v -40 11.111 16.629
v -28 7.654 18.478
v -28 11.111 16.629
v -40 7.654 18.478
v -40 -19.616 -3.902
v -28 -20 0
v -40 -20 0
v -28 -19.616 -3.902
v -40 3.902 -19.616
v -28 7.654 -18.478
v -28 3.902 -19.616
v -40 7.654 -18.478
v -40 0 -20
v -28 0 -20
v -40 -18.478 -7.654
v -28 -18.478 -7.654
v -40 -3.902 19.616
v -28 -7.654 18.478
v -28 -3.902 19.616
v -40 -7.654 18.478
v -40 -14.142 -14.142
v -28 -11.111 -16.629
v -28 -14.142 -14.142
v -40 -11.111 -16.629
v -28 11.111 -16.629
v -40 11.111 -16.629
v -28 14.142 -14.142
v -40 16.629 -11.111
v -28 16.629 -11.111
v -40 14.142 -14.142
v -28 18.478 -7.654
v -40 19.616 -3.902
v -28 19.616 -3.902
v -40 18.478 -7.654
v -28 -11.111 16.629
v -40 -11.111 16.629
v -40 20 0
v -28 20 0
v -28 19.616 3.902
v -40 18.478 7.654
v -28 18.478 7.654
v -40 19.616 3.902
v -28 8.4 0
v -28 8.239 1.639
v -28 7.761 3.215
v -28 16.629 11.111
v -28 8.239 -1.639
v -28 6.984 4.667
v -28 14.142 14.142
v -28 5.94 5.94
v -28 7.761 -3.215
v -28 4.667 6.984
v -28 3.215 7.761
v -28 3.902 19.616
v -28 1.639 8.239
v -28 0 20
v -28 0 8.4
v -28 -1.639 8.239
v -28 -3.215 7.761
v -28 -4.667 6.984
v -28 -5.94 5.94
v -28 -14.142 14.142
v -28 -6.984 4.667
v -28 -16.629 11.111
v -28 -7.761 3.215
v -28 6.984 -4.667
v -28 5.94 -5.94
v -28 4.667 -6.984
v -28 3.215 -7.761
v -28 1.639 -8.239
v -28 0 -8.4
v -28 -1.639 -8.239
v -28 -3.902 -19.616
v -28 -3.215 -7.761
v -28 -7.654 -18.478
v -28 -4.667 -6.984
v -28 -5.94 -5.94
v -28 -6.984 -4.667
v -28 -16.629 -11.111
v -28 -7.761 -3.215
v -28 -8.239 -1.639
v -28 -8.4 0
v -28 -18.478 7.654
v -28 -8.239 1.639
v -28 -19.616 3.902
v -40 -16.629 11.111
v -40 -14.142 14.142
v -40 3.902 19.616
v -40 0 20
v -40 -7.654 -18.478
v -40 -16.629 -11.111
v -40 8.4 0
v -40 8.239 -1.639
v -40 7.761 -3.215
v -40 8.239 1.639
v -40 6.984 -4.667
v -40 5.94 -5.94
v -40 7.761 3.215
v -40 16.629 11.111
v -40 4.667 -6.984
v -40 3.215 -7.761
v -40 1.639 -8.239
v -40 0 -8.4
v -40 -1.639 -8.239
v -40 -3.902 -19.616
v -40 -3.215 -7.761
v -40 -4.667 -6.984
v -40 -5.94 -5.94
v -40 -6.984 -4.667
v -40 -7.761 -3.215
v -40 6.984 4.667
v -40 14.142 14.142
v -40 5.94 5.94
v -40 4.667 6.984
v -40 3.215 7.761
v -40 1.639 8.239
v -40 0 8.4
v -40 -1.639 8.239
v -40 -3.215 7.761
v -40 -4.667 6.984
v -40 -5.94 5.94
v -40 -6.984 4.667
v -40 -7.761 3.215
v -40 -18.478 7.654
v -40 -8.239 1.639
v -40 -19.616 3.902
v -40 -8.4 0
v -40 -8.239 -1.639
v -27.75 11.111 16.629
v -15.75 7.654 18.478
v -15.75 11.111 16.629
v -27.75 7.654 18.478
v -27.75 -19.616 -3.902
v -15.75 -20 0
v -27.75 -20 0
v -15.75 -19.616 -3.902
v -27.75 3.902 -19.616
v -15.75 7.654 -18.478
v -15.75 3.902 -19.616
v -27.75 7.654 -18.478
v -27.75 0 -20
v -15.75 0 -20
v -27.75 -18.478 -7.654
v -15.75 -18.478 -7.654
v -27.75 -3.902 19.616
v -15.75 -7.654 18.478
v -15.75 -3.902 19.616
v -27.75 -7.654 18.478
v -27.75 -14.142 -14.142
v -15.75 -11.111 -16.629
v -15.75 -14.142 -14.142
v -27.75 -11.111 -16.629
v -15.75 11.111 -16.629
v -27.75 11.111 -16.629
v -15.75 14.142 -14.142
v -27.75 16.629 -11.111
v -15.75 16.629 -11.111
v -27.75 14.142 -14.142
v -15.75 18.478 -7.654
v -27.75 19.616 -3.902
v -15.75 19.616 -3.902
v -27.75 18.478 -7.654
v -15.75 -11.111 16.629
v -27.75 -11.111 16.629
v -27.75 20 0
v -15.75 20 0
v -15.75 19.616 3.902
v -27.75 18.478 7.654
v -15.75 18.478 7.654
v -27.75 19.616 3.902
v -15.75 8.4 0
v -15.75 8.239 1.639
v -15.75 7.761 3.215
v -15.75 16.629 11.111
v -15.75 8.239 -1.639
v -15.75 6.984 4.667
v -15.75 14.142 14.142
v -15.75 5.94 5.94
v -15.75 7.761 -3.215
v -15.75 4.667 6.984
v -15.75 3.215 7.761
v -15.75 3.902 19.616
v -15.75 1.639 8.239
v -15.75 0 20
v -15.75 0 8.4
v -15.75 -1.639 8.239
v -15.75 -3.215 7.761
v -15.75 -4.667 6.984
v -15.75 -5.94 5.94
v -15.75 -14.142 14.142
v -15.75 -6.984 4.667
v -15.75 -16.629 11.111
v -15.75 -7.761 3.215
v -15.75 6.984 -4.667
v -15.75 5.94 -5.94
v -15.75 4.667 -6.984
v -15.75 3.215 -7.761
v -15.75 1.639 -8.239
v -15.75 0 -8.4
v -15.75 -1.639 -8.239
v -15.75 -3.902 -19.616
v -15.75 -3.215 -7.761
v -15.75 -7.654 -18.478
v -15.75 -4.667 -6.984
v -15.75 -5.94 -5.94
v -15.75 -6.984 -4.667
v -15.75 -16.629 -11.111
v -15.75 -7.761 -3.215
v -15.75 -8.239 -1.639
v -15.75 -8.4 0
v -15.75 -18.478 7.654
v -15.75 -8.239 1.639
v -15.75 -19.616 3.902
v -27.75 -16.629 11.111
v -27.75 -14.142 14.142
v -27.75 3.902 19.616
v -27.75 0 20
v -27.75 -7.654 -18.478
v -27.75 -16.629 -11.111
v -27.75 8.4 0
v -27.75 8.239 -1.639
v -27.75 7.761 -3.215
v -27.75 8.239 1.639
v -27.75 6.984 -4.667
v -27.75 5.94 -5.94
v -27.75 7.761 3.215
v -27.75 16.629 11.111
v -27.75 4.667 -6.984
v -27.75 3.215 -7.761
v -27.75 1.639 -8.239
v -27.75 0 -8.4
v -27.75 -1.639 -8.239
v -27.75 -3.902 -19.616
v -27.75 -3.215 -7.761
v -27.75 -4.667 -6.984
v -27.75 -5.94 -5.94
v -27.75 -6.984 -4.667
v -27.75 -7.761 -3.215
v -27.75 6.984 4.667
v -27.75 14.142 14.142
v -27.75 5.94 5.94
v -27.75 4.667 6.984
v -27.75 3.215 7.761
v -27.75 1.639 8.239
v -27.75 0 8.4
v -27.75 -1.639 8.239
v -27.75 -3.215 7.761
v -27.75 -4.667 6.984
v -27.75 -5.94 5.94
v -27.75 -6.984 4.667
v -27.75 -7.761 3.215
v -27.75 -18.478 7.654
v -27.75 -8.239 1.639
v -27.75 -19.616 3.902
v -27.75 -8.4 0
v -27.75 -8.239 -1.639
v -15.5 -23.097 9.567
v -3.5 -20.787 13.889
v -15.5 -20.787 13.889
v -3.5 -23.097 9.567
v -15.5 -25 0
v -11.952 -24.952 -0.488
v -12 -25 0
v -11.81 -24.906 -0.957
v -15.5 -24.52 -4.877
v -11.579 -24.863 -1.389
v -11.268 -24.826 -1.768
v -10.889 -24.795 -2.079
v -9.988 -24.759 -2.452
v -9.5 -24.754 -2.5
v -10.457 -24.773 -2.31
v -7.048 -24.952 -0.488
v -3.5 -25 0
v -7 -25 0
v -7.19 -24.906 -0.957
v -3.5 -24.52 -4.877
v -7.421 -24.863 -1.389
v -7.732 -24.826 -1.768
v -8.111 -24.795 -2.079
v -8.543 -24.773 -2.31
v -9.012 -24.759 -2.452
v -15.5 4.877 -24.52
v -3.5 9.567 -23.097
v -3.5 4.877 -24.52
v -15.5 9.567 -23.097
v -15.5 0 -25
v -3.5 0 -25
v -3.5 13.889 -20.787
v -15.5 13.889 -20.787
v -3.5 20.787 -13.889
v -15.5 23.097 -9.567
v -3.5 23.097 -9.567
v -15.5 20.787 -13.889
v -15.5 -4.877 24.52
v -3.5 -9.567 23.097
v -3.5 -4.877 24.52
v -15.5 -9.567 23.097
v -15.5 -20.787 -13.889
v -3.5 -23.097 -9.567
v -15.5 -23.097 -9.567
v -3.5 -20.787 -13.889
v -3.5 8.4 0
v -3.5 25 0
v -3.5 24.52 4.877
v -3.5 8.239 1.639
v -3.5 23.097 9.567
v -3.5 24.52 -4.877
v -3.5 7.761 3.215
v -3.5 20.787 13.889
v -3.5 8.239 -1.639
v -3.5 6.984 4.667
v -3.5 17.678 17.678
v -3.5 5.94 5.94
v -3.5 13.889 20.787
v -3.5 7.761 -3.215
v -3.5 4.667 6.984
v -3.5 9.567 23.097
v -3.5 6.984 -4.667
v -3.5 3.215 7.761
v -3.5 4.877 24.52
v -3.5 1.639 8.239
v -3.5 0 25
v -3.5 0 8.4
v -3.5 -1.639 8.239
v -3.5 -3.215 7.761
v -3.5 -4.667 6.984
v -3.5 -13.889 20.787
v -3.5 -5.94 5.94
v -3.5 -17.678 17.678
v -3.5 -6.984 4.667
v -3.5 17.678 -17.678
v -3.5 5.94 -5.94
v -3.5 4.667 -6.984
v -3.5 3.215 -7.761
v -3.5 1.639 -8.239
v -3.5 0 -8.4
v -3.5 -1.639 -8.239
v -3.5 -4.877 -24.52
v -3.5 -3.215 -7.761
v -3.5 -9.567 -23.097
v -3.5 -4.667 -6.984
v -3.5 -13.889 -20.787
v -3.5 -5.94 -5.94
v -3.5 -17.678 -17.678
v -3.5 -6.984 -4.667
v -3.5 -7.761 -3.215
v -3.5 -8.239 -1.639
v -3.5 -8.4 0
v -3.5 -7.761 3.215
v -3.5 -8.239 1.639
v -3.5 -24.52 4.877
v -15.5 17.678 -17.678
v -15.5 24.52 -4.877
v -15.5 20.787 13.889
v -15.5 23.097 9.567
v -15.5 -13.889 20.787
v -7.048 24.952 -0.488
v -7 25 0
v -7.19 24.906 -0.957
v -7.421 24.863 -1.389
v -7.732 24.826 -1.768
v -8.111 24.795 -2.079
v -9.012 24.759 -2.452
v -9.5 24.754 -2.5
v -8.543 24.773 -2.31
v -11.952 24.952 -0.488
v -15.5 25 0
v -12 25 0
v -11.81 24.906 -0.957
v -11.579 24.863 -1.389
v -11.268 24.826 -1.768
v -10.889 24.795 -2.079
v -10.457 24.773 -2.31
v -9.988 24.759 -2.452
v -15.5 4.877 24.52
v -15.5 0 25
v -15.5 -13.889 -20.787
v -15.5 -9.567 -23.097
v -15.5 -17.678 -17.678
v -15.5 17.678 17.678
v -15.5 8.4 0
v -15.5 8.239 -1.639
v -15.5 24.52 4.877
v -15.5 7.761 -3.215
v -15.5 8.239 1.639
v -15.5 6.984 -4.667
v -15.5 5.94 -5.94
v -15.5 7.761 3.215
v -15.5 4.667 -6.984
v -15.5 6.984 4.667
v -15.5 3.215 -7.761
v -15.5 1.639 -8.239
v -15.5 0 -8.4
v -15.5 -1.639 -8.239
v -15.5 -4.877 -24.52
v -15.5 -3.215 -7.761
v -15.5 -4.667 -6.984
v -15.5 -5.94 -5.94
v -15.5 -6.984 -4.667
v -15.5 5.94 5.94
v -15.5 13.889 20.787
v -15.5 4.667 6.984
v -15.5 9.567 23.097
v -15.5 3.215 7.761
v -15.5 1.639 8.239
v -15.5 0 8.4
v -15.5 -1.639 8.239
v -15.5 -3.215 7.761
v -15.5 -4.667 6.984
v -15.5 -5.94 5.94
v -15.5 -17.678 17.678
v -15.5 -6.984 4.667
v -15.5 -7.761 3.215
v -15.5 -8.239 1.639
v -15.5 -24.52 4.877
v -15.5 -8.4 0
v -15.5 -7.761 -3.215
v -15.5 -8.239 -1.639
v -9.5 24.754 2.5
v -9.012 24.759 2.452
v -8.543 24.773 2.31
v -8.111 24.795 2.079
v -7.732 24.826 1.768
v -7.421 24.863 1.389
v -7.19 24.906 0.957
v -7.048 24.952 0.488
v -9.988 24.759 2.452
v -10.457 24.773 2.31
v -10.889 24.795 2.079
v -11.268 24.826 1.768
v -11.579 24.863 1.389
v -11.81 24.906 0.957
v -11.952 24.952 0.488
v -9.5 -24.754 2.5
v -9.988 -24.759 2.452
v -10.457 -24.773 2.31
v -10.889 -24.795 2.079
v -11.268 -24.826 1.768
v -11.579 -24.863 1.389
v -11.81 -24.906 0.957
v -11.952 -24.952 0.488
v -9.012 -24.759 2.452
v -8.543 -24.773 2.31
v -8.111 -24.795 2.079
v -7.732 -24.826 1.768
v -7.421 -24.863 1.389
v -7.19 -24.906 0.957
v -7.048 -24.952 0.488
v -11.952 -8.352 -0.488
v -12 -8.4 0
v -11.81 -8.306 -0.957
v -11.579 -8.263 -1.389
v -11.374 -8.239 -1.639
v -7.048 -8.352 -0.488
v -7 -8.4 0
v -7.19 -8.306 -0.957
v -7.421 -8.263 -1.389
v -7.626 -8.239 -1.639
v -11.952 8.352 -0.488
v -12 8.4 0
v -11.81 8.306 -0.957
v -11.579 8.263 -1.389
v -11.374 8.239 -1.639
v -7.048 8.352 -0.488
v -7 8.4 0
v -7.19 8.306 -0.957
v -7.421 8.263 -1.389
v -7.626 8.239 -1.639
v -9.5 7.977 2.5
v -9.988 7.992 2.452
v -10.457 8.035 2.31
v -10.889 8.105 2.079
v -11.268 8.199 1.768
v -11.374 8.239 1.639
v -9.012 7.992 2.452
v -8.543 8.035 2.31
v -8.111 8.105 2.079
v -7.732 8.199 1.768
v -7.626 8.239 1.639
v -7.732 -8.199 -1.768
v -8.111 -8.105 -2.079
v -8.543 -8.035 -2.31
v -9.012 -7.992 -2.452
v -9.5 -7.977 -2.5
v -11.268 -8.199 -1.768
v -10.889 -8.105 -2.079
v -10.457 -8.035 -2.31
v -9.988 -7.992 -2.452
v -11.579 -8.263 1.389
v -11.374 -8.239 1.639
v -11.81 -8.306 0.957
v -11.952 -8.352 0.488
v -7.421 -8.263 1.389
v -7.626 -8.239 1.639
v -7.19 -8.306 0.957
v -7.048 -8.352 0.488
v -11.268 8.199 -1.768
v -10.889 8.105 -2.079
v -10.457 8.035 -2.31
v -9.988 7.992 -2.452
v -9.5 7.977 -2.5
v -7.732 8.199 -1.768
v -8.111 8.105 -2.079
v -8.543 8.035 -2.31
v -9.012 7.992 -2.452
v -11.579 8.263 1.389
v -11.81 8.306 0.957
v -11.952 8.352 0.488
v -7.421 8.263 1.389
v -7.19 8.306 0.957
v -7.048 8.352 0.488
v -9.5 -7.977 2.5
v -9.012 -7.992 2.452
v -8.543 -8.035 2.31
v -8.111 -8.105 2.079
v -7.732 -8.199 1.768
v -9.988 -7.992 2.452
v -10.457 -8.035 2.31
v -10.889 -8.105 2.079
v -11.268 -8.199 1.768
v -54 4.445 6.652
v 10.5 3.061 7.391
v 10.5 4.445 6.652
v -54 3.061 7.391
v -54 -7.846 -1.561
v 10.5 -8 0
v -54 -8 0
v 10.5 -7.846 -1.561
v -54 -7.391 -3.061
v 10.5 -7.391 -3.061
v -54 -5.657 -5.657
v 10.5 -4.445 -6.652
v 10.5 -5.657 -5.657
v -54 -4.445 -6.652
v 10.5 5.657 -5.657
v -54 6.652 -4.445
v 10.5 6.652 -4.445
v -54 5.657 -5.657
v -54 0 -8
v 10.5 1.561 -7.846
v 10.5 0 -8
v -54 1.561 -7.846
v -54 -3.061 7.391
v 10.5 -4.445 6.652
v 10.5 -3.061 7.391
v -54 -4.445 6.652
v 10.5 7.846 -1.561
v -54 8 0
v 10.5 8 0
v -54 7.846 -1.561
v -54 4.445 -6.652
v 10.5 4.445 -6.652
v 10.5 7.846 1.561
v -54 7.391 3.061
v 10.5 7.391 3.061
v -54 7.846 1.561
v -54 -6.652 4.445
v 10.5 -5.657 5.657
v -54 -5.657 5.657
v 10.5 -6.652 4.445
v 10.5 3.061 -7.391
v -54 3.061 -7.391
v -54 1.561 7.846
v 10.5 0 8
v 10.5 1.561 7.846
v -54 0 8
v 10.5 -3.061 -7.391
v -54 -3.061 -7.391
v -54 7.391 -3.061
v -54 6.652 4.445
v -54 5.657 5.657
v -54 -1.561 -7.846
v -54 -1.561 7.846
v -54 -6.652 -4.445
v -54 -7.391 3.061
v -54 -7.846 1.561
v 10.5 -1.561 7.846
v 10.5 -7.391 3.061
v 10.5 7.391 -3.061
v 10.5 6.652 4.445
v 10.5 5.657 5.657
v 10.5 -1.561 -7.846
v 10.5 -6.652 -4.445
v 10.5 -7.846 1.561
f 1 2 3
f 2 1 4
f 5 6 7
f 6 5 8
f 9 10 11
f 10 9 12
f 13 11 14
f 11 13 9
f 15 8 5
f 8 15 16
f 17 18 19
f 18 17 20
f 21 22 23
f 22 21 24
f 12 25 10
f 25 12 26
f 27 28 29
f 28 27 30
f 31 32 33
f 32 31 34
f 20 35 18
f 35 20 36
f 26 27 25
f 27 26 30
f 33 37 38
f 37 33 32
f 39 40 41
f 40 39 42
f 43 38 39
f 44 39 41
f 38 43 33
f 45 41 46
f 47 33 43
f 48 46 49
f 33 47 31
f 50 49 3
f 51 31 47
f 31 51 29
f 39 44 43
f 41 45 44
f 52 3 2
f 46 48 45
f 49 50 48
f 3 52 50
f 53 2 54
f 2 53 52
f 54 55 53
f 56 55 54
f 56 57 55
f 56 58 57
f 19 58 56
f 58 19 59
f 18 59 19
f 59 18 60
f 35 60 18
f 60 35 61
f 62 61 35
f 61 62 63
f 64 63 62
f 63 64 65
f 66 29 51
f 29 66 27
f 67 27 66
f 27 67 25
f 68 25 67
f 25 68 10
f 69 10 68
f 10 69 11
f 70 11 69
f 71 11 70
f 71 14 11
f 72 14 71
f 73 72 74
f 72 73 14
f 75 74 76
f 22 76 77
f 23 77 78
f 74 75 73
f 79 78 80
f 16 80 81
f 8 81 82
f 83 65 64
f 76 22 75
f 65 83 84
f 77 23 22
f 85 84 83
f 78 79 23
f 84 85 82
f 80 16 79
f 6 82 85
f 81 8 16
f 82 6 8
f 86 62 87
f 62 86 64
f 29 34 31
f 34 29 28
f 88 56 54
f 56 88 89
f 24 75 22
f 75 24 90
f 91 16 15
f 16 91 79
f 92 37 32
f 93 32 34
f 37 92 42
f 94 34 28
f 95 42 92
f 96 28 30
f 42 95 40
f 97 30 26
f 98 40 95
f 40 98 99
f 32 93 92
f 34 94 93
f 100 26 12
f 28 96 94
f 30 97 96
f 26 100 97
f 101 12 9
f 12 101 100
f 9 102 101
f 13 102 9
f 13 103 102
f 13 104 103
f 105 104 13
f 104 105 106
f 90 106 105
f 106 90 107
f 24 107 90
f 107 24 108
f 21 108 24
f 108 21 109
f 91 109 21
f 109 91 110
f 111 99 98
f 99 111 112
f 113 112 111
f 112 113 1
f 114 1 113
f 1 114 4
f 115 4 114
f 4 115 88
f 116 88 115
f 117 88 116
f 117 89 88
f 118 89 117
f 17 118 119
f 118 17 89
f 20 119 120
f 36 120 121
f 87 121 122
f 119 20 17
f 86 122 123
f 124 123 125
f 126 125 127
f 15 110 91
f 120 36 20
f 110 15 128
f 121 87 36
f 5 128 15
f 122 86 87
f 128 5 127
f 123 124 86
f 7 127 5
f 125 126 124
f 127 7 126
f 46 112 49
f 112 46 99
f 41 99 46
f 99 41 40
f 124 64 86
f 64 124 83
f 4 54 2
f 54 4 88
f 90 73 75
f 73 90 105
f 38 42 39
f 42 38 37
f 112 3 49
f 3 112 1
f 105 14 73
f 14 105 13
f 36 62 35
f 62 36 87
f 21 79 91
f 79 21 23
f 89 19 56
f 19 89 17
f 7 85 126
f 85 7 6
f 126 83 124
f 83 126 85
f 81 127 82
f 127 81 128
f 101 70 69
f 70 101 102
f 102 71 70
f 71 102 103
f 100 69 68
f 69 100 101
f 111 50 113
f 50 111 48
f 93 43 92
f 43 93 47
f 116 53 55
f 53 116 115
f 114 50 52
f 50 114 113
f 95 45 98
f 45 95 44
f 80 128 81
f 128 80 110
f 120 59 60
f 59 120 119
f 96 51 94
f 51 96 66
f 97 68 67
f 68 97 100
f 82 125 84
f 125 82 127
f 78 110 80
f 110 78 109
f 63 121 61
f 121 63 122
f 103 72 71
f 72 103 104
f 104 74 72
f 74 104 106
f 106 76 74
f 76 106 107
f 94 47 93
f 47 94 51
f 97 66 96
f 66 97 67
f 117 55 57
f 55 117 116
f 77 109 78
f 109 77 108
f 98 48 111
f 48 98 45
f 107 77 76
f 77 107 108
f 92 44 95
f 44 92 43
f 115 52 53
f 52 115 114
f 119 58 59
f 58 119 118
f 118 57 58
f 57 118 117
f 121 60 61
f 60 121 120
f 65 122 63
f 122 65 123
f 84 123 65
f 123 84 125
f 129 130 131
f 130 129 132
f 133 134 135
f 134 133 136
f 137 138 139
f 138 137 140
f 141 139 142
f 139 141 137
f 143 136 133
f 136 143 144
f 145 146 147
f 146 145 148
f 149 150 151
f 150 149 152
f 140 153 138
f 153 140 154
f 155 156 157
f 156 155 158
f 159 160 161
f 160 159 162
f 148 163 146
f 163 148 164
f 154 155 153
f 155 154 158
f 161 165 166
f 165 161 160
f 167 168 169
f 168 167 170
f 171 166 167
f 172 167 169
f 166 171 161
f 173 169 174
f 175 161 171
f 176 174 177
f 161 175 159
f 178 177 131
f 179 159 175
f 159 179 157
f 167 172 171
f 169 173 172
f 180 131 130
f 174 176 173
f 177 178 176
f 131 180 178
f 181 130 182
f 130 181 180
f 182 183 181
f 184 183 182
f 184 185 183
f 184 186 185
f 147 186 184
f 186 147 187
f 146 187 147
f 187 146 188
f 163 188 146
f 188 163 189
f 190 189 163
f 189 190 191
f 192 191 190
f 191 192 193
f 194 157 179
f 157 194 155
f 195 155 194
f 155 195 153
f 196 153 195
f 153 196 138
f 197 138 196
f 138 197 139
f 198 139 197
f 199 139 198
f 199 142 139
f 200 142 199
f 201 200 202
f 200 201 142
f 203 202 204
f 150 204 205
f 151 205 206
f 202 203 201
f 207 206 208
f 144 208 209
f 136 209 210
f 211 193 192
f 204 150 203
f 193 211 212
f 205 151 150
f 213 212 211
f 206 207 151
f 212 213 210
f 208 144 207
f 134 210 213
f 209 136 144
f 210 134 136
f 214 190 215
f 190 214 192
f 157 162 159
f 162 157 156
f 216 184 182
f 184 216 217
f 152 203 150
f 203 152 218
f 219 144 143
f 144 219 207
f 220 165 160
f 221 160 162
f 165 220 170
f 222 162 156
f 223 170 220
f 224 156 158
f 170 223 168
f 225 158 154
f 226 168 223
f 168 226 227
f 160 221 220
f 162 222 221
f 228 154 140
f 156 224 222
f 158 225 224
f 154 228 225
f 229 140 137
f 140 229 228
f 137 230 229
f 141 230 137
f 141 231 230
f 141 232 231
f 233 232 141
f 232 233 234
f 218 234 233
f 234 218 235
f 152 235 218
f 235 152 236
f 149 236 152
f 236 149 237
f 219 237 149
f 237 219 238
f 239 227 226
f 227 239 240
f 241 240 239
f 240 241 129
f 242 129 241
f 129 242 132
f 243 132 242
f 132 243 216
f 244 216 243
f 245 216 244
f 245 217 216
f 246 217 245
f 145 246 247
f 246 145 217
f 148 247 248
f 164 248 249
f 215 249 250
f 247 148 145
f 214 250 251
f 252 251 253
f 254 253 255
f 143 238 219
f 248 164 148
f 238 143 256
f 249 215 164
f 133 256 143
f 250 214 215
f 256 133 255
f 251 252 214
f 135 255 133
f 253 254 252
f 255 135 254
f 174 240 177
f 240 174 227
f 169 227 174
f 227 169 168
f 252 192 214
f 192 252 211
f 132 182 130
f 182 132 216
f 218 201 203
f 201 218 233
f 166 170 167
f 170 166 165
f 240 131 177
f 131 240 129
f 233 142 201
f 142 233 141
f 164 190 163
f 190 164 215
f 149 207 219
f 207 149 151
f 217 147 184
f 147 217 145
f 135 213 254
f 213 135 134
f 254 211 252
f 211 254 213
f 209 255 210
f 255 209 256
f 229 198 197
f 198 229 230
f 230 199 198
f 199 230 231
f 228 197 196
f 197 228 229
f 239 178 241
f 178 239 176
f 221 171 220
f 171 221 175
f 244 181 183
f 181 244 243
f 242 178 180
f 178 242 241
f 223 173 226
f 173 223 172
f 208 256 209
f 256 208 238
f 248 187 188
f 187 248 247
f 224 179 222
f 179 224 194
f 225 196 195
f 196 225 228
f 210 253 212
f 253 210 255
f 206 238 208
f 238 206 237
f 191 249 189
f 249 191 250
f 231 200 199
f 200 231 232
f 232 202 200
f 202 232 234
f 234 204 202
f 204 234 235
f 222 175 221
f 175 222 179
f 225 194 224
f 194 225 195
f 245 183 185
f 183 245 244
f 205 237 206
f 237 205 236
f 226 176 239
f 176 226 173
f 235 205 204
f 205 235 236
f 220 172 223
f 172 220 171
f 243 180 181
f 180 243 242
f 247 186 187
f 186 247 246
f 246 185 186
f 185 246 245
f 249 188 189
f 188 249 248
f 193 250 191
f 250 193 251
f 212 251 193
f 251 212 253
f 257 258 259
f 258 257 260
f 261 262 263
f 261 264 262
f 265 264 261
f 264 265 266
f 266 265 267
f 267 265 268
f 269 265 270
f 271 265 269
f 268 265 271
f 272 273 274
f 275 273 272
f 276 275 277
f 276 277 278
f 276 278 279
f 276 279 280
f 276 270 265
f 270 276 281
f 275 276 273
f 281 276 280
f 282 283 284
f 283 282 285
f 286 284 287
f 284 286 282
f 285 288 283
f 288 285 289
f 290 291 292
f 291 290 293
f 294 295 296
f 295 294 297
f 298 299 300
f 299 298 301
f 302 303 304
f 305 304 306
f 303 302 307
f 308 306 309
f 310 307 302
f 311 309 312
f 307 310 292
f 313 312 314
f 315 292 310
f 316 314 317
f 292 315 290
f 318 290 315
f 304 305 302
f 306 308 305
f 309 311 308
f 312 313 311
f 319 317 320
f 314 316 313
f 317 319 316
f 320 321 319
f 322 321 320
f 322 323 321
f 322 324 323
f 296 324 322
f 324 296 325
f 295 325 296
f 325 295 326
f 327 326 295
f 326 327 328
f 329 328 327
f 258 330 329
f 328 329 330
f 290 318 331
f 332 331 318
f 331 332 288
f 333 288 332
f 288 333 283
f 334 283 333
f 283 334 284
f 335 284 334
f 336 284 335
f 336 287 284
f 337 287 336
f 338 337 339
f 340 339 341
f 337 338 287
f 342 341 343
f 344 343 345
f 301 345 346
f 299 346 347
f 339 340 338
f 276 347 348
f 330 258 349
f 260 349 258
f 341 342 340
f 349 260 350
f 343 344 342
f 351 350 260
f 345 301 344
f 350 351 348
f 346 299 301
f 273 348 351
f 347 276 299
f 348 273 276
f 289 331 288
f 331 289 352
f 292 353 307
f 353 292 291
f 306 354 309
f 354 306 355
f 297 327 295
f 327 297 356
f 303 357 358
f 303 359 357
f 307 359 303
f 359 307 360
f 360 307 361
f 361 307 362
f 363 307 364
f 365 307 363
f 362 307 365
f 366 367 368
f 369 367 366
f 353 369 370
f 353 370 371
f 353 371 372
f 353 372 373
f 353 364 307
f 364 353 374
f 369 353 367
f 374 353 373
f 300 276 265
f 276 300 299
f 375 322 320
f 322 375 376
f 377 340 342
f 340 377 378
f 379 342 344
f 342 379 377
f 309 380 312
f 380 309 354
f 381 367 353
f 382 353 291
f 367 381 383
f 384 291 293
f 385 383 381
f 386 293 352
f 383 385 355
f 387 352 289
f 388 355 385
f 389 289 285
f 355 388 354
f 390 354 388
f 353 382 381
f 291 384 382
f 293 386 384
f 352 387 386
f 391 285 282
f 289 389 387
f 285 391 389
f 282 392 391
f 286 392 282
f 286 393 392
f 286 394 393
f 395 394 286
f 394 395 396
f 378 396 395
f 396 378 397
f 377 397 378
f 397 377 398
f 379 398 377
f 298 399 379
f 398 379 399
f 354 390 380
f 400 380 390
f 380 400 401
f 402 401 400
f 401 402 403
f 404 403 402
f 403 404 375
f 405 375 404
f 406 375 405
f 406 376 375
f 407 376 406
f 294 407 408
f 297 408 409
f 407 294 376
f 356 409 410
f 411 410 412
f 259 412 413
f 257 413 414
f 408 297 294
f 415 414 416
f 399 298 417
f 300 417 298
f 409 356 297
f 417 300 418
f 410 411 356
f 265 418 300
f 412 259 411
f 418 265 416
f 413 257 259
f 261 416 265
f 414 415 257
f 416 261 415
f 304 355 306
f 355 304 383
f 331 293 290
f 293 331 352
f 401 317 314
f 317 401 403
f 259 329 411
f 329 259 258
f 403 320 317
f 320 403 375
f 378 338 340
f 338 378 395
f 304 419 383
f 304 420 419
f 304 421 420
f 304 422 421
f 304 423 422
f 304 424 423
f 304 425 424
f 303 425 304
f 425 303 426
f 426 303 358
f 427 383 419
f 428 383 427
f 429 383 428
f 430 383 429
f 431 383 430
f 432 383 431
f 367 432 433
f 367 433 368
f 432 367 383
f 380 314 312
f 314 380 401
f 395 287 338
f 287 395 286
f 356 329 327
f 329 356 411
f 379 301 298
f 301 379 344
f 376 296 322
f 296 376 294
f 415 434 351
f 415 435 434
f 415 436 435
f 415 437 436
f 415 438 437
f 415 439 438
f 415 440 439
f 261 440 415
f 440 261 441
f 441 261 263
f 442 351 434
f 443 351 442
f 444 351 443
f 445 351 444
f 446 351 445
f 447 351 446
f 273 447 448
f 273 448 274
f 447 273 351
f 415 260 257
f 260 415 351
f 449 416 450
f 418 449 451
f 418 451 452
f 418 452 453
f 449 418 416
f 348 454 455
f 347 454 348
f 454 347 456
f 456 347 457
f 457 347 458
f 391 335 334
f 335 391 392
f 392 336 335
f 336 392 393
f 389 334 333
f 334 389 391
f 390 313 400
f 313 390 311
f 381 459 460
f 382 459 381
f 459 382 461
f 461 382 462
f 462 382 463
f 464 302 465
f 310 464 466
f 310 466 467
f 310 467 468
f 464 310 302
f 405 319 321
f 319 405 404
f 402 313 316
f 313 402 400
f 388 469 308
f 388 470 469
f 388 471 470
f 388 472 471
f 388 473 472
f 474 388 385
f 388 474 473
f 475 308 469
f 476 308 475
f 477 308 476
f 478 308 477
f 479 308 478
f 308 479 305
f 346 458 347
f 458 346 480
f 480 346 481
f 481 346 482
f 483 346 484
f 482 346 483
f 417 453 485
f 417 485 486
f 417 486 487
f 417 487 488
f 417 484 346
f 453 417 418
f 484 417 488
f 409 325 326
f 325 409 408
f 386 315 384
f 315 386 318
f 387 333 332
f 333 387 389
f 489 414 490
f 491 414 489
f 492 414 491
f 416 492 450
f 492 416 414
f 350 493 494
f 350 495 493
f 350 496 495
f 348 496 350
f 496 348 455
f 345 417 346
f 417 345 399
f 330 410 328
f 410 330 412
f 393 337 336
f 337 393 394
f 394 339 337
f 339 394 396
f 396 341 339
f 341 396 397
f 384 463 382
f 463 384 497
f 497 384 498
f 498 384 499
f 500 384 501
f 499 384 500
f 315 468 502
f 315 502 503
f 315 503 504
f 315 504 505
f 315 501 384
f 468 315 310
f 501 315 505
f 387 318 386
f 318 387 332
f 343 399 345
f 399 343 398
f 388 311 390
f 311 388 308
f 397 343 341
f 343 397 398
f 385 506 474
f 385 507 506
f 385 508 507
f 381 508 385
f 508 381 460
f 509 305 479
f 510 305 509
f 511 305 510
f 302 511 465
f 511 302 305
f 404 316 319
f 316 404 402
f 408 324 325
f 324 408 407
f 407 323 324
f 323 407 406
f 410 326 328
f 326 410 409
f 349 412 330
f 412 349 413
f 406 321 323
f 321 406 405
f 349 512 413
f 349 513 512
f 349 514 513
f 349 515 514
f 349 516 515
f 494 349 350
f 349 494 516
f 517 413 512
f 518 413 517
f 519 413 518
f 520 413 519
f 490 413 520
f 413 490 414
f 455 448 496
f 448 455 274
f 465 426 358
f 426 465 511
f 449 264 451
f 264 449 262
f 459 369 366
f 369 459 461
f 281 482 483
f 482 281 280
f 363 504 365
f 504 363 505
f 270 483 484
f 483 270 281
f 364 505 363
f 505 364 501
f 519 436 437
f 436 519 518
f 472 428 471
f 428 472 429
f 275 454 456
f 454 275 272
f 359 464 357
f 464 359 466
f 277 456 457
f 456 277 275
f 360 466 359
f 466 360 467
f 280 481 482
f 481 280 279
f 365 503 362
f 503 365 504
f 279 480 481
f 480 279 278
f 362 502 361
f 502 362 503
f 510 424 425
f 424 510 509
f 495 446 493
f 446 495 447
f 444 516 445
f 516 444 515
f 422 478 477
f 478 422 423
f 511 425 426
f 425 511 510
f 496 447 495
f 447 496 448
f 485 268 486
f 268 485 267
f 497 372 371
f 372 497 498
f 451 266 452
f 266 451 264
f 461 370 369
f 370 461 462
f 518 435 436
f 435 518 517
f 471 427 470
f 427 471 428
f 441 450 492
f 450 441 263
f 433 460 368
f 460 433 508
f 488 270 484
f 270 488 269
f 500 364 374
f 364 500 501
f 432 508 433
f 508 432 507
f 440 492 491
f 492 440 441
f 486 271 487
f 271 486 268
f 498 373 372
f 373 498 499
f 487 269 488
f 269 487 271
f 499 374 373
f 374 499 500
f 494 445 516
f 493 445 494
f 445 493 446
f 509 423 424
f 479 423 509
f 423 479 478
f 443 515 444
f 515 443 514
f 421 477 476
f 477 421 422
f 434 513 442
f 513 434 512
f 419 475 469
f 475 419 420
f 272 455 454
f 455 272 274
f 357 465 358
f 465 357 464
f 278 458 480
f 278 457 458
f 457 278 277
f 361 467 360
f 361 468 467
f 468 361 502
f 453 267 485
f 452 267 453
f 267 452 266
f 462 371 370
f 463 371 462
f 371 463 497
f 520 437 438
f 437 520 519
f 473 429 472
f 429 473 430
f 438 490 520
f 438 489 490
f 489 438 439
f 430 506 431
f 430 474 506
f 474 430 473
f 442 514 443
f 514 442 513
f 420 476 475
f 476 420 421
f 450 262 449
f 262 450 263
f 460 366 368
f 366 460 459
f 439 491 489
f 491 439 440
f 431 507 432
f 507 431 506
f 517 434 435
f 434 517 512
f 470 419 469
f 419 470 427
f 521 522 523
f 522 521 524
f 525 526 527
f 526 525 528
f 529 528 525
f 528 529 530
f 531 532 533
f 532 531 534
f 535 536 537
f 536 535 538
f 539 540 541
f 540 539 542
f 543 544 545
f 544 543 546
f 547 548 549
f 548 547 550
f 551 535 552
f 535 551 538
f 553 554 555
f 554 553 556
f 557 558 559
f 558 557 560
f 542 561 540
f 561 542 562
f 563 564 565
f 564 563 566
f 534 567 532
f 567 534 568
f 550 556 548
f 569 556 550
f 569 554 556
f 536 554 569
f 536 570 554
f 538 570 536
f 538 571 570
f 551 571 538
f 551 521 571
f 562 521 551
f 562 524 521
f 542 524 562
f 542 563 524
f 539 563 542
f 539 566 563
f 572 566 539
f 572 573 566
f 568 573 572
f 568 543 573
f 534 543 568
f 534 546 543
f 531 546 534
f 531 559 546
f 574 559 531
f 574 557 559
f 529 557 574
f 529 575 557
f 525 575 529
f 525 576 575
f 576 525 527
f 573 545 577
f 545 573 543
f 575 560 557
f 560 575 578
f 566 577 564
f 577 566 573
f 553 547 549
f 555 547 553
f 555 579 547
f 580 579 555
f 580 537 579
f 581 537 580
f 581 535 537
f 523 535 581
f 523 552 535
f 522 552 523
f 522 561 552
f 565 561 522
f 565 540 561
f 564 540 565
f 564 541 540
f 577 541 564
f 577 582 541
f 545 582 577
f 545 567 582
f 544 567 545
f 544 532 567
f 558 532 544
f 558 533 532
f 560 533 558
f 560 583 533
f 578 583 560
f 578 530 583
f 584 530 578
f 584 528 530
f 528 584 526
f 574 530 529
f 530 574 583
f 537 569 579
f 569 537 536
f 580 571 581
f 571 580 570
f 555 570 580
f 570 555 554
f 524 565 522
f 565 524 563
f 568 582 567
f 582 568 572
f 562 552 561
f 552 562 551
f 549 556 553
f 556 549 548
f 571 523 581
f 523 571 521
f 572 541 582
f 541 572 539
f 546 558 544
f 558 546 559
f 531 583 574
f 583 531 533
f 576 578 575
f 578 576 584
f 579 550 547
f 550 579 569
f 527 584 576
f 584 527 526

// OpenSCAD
$fn = 32;

// ------------------------------------------------------------------------
// Shaft with rings and collars: d16 shaft, 3 rings
// Every part is its own module, assembly() places them once.
// ------------------------------------------------------------------------

// --- part 1 ---
module shaft() {
  translate([0, 0, -32.25]) cylinder(h = 64.5, d = 16);
}

// --- part 2 ---
module spacer_a() {
  difference() {
      translate([0, 0, 0]) cylinder(h = 12, d = 40);
      translate([0, 0, -1]) cylinder(h = 14, d = 16.8);
    }
}

// --- part 3 ---
module spacer_b() {
  difference() {
      translate([0, 0, 0]) cylinder(h = 12, d = 40);
      translate([0, 0, -1]) cylinder(h = 14, d = 16.8);
    }
}

// --- part 4 ---
module collar_a() {
  difference() {
    cylinder(h = 12, d = 50);
    translate([0, 0, -1]) cylinder(h = 14, d = 16.8);
    translate([0, 0, 6]) rotate([90, 0, 0]) cylinder(h = 52, d = 5, center = true);
  }
}

// --- assembly ---
module assembly() {
  translate([-21.75, 0, 0]) rotate([0, 90, 0]) shaft();
  translate([-40, 0, 0]) rotate([0, 90, 0]) spacer_a();
  translate([-27.75, 0, 0]) rotate([0, 90, 0]) spacer_b();
  translate([-15.5, 0, 0]) rotate([0, 90, 0]) collar_a();
}

assembly();
